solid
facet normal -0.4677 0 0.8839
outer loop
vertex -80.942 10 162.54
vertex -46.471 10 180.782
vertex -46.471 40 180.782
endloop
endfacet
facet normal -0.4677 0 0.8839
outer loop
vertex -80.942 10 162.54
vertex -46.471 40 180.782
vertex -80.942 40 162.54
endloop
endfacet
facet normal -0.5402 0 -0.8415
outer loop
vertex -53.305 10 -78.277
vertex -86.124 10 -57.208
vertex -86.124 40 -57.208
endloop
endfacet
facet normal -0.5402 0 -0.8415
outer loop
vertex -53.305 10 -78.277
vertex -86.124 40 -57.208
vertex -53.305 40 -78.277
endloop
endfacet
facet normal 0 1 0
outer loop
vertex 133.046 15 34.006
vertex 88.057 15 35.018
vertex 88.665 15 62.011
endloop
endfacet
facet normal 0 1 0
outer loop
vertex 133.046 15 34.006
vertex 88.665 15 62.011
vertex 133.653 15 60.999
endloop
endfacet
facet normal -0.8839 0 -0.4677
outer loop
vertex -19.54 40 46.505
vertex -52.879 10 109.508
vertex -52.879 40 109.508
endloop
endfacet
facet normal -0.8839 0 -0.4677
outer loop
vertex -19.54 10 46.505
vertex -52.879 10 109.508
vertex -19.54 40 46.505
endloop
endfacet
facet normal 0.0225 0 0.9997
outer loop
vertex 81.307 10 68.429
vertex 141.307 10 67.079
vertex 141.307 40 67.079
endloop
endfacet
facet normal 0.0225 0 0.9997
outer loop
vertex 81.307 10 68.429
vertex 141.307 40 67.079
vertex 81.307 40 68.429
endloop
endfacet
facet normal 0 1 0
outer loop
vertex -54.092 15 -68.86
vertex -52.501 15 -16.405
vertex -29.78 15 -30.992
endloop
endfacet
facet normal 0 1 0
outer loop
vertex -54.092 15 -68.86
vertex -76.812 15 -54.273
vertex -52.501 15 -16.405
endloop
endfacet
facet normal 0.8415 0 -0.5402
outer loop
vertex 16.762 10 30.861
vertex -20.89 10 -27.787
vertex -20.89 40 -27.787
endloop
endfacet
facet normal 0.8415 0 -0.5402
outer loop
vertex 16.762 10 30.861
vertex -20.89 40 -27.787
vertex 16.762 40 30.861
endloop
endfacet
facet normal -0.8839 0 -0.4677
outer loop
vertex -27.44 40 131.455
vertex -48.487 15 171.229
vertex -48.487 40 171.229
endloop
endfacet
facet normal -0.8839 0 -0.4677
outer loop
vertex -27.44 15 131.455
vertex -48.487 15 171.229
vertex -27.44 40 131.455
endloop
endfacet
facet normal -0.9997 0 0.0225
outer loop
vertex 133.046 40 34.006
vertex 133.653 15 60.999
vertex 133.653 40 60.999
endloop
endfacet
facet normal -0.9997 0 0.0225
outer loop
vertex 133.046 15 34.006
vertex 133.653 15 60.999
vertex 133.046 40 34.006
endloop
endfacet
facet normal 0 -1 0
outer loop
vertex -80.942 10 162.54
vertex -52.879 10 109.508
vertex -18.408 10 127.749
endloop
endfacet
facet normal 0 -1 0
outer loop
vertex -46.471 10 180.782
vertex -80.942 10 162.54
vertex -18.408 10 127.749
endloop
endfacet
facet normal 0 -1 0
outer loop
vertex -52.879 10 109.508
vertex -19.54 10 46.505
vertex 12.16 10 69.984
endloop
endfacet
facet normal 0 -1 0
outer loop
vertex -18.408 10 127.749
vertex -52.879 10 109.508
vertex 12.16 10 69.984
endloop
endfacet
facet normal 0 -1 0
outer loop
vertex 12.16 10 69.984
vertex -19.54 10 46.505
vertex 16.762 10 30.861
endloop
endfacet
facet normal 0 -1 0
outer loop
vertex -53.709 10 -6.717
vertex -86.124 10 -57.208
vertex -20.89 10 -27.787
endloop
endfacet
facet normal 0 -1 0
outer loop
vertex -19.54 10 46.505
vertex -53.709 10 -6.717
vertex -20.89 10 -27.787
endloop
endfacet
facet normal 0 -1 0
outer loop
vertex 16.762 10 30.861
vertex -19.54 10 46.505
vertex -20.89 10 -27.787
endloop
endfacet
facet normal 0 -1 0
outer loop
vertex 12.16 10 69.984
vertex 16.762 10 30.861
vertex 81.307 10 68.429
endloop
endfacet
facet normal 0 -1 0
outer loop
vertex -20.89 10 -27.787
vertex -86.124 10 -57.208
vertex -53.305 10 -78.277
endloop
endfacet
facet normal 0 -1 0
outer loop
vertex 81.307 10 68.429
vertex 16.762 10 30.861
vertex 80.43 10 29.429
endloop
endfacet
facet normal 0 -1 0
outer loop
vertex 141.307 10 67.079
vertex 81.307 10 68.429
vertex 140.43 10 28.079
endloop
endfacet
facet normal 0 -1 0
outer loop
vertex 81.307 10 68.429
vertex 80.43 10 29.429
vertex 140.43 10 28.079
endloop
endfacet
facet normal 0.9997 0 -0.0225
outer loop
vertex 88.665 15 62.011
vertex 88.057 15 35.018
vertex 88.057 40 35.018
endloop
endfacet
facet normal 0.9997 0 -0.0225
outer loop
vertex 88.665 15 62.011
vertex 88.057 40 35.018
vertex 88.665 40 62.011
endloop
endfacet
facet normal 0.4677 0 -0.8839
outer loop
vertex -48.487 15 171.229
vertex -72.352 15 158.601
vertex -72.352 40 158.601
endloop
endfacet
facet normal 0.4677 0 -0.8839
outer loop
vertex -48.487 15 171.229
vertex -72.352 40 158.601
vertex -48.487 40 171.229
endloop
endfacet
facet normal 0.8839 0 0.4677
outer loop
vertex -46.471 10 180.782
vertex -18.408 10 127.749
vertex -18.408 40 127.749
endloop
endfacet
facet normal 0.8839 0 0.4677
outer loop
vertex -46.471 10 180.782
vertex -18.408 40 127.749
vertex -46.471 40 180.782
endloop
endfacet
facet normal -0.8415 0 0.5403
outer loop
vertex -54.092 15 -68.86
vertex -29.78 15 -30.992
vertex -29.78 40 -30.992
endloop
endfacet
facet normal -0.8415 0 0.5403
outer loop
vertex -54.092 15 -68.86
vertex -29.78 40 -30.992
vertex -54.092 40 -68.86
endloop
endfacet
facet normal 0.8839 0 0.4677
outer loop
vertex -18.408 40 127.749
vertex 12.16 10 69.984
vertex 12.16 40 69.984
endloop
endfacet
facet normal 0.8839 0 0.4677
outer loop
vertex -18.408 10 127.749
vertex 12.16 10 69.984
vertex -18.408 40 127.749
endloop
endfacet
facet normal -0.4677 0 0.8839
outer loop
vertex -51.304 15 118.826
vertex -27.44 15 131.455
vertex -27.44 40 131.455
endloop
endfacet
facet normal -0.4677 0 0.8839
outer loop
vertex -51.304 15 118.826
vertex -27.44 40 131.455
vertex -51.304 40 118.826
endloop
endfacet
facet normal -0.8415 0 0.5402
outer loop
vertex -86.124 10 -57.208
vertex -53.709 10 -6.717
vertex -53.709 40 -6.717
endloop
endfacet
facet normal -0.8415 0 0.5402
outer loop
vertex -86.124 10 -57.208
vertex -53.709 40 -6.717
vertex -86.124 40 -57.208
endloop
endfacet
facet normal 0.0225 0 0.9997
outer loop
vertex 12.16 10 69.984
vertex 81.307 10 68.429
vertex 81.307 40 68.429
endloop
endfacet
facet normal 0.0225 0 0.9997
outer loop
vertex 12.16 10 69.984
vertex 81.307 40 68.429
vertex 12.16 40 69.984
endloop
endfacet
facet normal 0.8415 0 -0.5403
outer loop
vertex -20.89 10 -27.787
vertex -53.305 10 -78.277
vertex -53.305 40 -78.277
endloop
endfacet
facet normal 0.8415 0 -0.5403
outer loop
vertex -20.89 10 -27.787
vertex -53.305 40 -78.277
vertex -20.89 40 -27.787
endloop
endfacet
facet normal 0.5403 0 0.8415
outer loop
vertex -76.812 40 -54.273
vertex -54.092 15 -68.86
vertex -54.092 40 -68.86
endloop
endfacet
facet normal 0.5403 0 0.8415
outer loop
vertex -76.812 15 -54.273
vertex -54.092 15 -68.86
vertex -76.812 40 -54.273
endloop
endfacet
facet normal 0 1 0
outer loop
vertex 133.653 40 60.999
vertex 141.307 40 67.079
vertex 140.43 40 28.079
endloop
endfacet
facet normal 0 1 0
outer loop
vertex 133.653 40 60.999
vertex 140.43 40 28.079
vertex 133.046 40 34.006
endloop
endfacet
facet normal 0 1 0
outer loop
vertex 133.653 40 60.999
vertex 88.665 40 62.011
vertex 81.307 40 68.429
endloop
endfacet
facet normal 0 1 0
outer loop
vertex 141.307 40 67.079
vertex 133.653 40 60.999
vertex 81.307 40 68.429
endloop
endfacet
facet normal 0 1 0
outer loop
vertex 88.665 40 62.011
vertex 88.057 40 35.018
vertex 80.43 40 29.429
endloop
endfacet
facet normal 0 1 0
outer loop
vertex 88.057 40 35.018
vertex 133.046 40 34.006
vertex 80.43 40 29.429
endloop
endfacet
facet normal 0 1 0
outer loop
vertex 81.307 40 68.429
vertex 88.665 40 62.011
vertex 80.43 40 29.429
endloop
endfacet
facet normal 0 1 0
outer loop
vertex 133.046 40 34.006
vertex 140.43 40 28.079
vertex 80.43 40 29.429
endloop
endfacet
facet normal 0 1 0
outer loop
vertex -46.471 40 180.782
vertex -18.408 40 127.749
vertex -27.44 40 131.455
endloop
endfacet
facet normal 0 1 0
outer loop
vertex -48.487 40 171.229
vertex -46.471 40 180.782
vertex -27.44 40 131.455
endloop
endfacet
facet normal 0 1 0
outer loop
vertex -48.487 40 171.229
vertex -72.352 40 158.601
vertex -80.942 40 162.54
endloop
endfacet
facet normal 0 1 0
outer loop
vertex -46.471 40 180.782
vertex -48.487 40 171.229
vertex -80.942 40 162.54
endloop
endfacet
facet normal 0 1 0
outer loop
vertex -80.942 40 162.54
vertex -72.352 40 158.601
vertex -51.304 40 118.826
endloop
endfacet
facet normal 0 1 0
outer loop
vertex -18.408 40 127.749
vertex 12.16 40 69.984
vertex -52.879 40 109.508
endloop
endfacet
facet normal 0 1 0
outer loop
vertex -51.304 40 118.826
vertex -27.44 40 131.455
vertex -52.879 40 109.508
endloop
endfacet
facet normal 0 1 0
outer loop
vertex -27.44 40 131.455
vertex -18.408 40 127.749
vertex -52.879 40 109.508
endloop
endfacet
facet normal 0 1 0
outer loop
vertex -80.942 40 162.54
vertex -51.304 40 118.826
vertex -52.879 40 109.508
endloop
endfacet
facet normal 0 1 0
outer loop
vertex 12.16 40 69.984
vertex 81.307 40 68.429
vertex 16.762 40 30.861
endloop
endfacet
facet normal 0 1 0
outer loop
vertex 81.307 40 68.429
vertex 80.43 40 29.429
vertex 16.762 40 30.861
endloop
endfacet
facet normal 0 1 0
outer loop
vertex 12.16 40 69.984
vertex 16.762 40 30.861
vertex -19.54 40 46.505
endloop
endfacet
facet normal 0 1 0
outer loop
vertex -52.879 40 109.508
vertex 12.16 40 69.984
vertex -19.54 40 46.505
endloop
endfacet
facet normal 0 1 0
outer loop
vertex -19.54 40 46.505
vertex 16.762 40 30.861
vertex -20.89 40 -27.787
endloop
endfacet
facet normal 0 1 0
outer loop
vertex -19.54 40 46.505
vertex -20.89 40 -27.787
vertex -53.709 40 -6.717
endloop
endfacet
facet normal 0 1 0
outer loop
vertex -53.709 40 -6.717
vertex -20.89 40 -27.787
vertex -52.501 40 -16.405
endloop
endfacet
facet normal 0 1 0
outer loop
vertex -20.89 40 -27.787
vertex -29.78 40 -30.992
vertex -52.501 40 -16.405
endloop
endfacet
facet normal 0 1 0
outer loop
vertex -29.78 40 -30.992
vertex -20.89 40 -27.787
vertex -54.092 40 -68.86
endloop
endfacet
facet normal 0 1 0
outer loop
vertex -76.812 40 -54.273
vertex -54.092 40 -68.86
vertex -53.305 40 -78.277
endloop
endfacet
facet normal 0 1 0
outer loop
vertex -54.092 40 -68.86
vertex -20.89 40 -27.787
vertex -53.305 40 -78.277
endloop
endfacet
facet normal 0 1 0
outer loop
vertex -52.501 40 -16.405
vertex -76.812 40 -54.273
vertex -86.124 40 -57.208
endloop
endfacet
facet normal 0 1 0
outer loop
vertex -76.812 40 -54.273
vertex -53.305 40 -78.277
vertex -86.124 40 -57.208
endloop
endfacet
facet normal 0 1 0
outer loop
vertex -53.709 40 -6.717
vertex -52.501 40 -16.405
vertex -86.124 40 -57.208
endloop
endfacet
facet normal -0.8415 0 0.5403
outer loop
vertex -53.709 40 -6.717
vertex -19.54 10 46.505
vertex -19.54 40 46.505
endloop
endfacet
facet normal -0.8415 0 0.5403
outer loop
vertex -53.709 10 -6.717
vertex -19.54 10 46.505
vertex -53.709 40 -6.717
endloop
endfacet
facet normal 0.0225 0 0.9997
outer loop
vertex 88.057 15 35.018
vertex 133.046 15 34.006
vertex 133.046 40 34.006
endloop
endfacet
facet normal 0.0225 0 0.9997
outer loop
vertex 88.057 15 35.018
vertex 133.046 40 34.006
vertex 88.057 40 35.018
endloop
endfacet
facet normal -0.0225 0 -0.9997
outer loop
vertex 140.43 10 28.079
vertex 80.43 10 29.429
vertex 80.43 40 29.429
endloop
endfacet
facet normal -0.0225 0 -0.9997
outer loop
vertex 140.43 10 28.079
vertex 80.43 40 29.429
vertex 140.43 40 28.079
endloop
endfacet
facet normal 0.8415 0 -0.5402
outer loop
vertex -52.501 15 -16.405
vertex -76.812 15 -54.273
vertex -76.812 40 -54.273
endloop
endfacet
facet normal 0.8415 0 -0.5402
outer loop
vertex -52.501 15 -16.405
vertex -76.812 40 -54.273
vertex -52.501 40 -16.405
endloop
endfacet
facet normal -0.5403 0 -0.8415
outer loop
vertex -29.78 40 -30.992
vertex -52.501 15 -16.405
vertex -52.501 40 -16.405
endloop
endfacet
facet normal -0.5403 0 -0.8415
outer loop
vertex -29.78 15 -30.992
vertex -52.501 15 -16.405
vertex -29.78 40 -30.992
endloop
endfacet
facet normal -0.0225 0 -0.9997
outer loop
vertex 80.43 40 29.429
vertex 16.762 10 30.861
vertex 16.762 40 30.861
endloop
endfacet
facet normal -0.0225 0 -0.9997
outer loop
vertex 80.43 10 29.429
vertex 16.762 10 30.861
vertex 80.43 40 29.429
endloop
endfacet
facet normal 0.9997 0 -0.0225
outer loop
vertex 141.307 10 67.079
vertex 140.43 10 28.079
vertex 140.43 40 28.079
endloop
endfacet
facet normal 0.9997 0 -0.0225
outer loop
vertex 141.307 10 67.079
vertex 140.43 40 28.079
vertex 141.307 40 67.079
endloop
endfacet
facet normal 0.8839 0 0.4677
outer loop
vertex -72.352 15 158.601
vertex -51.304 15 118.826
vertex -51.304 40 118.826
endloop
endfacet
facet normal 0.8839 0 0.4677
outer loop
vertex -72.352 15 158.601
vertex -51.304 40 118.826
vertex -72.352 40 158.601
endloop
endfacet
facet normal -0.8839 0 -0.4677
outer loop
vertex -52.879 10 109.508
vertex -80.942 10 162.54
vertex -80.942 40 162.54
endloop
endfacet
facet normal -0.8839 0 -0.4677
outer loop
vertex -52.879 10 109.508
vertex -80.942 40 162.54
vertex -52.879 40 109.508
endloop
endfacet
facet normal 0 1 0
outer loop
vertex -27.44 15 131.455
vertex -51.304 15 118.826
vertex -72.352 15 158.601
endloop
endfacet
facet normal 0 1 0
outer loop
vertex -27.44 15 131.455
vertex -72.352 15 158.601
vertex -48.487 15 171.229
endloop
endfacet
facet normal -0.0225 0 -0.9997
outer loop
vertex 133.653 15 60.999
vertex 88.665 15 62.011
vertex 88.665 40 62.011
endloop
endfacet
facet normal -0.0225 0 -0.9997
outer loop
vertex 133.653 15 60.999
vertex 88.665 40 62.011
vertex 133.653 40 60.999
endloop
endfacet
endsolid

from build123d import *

# Parameters (mm, degrees)
SKETCH2_W           = 300
SKETCH2_H           = 300
BOSS_EXTRUDE1_DEPTH = 10
BOSS_EXTRUDE3_DEPTH = 30
SKETCH2_2_W         = 300
SKETCH2_2_H         = 300
CUT_EXTRUDE1_DEPTH  = 10
BOSS_EXTRUDE4_DEPTH = 5


with BuildPart() as part:
    # Sketch2 → Boss-Extrude1 (new body)
    with BuildSketch(Plane(origin=(0, 0, 0), x_dir=(1, 0, 0), z_dir=(0, 1, 0))):
        with Locations((20.355411955, -44.224555735)):
            Rectangle(SKETCH2_W, SKETCH2_H)
    extrude(amount=BOSS_EXTRUDE1_DEPTH)

    # Sketch7 → Boss-Extrude3 (add)
    with BuildSketch(Plane(origin=(0, 10, 0), x_dir=(1, 0, 0), z_dir=(0, 1, 0))):
        Polygon((-80.941936453, -162.540499595), (-46.470752527, -180.781592729), (12.159859746, -69.984141911), (141.307092119, -67.078746484), (140.429718136, -28.078746484), (16.762252316, -30.86086487), (-53.304823682, 78.277282816), (-86.123521283, 57.207563128), (-19.539590898, -46.505153929), align=None)
        Polygon((-51.304328835, -118.826374708), (-27.43966304, -131.454823801), (-48.487078194, -171.229266792), (-72.351743989, -158.6008177), align=None, mode=Mode.SUBTRACT)
        Polygon((-52.501030421, 16.405104768), (-76.812245446, 54.27283277), (-54.091608645, 68.859561784), (-29.78039362, 30.991833782), align=None, mode=Mode.SUBTRACT)
        Polygon((88.0573666, -35.018280322), (133.045983567, -34.006181808), (133.653242675, -60.999351988), (88.664625709, -62.011450502), align=None, mode=Mode.SUBTRACT)
    extrude(amount=BOSS_EXTRUDE3_DEPTH)

    # Sketch2<2> → Cut-Extrude1 (cut)
    with BuildSketch(Plane(origin=(0, 0, 0), x_dir=(1, 0, 0), z_dir=(0, 1, 0))):
        with Locations((20.355411955, -44.224555735)):
            Rectangle(SKETCH2_2_W, SKETCH2_2_H)
    extrude(amount=CUT_EXTRUDE1_DEPTH, mode=Mode.SUBTRACT)

    # Sketch7<3> → Boss-Extrude4 (add)
    with BuildSketch(Plane(origin=(0, 10, 0), x_dir=(1, 0, 0), z_dir=(0, 1, 0))):
        Polygon((-76.812245446, 54.27283277), (-52.501030421, 16.405104768), (-29.78039362, 30.991833782), (-54.091608645, 68.859561784), align=None)
        Polygon((-48.487078194, -171.229266792), (-27.43966304, -131.454823801), (-51.304328835, -118.826374708), (-72.351743989, -158.6008177), align=None)
        Polygon((133.045983567, -34.006181808), (88.0573666, -35.018280322), (88.664625709, -62.011450502), (133.653242675, -60.999351988), align=None)
    extrude(amount=BOSS_EXTRUDE4_DEPTH)


solid = part.part
